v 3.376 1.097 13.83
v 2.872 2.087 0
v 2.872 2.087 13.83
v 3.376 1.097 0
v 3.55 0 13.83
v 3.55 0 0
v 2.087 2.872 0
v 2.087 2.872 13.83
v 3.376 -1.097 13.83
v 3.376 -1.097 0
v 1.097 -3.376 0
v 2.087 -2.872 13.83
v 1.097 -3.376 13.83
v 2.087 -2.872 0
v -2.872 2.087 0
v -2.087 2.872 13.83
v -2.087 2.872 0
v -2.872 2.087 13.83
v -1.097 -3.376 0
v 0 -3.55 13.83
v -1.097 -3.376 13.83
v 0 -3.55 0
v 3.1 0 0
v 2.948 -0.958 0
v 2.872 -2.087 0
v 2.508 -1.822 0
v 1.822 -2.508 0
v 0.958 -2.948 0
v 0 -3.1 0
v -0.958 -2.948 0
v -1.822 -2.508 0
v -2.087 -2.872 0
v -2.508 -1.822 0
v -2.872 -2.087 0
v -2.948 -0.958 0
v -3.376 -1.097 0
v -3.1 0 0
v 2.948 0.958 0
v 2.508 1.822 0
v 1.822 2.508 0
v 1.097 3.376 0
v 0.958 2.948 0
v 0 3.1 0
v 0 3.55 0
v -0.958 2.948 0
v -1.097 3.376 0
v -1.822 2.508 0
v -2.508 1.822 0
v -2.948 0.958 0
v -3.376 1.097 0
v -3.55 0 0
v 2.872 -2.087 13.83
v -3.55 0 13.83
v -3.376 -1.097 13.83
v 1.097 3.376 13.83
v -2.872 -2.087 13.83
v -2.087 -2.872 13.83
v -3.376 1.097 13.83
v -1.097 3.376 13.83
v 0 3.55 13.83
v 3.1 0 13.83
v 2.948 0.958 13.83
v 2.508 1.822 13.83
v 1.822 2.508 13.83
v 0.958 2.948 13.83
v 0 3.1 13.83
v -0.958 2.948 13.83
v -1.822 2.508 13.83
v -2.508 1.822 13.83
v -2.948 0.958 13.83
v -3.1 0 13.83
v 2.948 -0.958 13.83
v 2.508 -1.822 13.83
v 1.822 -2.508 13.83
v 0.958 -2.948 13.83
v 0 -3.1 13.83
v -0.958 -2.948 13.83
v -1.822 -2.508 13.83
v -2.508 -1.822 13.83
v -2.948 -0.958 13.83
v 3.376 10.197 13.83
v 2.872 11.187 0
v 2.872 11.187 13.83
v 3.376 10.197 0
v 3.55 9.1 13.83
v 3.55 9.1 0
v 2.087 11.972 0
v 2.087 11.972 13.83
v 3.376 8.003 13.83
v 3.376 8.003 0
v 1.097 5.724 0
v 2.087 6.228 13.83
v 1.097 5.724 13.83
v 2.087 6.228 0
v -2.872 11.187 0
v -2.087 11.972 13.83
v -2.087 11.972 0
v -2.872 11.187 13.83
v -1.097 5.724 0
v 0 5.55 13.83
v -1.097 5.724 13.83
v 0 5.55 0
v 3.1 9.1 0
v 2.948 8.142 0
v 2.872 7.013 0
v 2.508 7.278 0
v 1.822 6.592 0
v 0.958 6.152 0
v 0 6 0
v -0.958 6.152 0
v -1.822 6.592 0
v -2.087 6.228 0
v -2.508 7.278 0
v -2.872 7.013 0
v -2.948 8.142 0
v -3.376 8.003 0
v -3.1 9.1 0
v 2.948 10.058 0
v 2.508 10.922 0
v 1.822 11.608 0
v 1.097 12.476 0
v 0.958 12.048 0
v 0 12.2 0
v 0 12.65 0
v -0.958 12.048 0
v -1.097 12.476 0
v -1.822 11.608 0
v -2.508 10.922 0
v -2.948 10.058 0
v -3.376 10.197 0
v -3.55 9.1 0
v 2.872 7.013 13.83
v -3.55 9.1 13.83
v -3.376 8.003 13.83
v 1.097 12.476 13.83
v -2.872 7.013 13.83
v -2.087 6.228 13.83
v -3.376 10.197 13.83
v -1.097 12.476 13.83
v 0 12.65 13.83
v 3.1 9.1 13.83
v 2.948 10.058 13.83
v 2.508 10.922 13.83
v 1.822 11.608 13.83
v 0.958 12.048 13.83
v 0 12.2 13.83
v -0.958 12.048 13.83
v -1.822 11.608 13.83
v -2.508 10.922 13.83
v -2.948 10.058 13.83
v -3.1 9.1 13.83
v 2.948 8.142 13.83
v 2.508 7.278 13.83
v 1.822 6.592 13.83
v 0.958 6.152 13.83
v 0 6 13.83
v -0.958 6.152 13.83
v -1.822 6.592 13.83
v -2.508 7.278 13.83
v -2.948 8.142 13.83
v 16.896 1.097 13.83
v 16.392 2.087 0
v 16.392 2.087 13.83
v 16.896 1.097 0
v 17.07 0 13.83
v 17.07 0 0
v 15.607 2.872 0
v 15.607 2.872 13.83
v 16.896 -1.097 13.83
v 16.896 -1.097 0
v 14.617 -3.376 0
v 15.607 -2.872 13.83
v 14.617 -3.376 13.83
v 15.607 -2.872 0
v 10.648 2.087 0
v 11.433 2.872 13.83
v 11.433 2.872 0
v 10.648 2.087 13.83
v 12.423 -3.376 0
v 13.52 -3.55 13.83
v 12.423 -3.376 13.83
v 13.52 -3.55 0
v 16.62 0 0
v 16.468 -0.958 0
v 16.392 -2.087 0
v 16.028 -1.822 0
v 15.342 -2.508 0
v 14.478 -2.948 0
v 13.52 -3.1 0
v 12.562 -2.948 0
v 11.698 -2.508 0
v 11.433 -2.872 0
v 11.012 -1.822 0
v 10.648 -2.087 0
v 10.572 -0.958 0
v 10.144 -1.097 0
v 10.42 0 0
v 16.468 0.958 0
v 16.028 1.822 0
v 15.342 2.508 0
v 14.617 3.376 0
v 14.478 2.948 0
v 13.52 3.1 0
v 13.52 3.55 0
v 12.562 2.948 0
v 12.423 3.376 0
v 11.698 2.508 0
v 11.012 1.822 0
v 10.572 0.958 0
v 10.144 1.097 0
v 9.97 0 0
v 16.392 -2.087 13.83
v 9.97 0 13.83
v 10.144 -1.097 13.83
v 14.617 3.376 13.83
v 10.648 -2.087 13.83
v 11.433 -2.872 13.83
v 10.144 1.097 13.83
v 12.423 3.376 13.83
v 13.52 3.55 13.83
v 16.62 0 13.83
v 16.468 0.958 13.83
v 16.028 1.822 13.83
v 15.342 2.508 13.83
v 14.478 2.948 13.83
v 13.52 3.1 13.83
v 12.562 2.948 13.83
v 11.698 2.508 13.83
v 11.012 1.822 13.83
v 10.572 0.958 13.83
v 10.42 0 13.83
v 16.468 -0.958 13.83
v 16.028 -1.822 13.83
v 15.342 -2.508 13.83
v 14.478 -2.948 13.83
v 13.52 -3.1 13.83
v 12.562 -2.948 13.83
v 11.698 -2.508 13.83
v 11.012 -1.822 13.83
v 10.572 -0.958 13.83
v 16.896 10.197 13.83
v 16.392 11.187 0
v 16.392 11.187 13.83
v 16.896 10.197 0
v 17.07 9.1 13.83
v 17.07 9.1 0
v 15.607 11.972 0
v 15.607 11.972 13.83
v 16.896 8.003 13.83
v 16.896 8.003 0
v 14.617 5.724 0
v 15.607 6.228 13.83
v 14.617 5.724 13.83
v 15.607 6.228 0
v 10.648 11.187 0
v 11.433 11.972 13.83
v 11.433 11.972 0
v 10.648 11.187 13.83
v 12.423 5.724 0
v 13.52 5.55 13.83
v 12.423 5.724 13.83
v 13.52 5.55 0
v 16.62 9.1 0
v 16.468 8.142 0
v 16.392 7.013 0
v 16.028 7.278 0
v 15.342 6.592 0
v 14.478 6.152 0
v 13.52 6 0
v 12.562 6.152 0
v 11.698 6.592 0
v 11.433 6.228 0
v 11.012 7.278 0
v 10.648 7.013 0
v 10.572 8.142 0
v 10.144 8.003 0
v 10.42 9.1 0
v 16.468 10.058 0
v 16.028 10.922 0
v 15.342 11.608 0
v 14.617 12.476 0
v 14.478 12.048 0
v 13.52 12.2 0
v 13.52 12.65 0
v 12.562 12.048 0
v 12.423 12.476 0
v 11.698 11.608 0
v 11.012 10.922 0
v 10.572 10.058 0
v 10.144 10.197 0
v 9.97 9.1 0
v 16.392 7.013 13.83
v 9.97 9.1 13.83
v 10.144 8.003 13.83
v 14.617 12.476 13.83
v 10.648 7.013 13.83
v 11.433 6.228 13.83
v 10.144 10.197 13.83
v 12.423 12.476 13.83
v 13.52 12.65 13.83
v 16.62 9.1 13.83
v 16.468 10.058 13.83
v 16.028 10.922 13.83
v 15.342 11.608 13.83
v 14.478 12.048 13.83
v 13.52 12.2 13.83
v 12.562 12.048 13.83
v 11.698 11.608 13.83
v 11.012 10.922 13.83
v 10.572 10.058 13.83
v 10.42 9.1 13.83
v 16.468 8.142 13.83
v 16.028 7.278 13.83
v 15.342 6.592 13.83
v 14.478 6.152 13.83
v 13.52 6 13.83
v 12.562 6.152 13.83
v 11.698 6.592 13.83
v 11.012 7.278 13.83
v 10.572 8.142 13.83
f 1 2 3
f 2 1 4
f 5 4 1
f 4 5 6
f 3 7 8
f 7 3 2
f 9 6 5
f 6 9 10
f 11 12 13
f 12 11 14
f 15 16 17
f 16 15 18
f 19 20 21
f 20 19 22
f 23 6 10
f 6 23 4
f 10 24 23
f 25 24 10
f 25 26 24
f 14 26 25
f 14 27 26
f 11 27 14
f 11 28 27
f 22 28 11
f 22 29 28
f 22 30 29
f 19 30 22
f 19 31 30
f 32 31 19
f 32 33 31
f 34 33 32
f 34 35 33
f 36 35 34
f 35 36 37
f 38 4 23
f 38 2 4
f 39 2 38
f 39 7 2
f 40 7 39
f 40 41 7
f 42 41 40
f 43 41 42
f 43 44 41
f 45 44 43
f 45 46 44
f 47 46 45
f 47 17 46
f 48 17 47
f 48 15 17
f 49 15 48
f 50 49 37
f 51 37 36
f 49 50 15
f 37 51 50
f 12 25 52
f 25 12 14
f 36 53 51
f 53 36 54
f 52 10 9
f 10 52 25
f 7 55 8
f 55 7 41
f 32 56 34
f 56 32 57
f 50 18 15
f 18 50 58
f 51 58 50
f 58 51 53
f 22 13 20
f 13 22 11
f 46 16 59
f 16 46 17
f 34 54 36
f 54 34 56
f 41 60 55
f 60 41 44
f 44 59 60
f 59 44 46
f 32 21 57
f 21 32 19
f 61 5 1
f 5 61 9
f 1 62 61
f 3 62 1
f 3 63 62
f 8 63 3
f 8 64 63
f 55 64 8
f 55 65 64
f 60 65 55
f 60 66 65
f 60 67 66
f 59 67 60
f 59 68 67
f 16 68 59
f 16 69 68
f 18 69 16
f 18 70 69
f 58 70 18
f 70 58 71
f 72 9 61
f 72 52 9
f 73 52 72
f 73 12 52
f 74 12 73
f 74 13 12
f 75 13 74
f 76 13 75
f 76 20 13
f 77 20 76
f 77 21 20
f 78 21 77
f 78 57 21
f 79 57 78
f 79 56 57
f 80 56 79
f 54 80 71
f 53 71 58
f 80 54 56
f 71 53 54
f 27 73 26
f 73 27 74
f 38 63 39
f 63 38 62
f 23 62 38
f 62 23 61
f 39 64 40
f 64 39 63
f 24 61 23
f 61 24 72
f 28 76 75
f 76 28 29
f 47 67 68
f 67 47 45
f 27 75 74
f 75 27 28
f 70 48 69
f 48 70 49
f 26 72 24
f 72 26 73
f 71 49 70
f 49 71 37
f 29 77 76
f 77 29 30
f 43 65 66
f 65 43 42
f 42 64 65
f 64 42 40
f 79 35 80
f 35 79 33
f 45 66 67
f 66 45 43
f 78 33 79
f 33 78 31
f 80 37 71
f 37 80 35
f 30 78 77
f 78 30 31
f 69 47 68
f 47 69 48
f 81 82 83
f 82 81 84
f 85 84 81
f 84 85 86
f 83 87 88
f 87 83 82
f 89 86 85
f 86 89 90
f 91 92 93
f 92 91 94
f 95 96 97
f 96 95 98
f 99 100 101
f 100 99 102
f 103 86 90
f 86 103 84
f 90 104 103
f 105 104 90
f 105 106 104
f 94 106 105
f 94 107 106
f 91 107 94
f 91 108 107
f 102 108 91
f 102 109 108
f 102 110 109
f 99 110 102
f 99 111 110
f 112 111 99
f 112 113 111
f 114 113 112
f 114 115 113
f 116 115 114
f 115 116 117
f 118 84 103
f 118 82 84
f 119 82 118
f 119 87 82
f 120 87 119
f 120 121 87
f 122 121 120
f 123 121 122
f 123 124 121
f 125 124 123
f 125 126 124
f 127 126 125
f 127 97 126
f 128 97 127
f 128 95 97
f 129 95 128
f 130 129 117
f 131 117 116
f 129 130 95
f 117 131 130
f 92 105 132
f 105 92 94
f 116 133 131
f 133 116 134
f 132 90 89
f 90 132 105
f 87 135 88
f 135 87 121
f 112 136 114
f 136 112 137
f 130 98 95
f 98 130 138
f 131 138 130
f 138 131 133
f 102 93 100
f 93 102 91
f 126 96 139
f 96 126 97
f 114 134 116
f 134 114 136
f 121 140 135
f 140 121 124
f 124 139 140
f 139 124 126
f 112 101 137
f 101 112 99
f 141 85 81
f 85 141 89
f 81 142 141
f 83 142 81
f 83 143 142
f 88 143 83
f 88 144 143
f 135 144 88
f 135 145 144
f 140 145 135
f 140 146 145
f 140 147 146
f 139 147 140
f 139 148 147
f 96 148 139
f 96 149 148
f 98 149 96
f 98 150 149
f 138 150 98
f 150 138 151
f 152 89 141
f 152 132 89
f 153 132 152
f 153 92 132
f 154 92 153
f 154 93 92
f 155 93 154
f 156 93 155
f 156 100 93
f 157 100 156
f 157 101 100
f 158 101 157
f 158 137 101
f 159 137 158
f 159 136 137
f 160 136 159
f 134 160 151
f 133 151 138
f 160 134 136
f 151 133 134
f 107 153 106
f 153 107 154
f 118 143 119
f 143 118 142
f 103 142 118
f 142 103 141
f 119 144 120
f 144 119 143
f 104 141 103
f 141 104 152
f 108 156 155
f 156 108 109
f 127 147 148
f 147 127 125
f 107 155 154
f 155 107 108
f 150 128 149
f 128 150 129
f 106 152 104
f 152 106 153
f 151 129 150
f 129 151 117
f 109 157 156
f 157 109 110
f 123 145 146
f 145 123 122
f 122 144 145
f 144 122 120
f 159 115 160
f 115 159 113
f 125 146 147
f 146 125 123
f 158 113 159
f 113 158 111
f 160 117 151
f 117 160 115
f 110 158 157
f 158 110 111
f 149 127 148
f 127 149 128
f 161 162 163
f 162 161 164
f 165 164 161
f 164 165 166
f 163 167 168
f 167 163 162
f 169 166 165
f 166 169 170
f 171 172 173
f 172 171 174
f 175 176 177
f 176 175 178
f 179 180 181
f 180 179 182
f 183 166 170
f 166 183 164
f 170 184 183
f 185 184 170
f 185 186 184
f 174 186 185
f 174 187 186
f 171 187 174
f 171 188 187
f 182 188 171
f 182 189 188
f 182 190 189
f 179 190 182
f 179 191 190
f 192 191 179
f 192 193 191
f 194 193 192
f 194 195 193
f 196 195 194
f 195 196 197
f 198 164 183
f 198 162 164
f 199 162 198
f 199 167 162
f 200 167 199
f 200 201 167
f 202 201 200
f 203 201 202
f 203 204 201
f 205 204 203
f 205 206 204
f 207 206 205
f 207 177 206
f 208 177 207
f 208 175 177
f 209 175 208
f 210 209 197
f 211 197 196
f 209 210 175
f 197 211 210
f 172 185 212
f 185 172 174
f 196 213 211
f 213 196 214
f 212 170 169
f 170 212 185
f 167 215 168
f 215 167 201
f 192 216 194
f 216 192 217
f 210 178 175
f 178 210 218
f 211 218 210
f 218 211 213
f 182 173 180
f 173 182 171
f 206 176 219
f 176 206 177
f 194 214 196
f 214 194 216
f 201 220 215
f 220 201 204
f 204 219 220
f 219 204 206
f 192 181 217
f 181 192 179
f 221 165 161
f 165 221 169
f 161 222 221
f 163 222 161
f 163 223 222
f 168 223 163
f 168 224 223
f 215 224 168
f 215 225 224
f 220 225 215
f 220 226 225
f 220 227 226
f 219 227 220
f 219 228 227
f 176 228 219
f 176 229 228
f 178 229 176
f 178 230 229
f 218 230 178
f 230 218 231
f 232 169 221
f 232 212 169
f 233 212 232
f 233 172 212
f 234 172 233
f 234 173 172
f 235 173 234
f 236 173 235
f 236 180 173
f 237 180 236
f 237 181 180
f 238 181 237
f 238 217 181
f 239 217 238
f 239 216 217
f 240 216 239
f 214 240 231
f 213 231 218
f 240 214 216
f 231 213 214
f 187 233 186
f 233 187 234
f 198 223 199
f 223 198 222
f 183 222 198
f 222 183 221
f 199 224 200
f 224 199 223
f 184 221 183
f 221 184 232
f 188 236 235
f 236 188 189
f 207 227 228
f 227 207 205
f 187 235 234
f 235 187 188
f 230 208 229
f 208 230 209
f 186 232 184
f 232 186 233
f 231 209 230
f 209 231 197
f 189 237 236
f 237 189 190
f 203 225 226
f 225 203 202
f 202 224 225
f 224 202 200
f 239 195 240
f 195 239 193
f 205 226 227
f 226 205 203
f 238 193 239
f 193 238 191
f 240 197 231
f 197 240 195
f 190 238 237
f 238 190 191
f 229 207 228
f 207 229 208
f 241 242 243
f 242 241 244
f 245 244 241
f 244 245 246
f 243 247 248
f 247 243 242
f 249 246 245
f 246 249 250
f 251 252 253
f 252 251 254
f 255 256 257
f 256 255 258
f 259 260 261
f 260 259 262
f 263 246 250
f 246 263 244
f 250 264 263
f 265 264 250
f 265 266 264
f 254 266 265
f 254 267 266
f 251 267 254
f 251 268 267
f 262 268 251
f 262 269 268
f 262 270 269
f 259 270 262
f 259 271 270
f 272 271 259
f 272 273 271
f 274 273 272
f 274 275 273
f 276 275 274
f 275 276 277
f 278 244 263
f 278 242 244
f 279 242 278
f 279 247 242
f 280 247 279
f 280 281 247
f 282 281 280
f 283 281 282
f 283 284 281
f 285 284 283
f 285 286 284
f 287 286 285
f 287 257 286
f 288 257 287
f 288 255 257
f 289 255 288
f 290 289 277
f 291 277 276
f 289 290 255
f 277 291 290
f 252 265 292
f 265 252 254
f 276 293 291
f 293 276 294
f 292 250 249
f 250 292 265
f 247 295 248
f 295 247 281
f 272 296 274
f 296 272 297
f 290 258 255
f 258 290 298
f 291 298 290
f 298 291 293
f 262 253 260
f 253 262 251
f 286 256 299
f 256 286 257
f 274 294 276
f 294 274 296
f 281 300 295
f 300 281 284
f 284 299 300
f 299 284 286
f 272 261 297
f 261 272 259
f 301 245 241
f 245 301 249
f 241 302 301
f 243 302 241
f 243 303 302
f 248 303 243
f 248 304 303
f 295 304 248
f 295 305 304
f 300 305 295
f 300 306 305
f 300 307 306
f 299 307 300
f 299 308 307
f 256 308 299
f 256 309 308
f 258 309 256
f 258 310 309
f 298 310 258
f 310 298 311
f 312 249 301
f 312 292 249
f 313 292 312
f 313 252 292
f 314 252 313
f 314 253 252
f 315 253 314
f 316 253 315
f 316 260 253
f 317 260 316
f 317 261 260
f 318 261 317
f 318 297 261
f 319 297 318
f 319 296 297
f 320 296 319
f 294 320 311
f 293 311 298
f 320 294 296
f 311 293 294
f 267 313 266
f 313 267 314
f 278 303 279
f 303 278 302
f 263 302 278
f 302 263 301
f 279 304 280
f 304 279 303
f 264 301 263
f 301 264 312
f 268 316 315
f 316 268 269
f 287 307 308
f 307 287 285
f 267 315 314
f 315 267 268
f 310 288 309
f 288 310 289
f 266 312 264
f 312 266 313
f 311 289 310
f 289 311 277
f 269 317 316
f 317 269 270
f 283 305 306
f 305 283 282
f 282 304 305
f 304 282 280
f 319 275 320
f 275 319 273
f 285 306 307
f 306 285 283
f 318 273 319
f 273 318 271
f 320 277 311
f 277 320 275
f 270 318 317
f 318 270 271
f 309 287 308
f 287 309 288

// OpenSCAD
//spacers

//variables
dExterior = 7.1;
hExterior = 13.83;
dInterior = 6.2;
hInterior = hExterior*2;

xDiff = 6.42 + dExterior;
yDiff = 2 + dExterior;

//modules
module body3(){
    separator();
    translate([0,yDiff,0])
        separator();
    translate([xDiff,0,0])
        separator();
    translate([xDiff,yDiff,0])
        separator();
}

module separator(){
    translate([0,0,hExterior/2])
        difference(){
            cylinder(h=hExterior, d=dExterior, center=true, $fn=20);
            cylinder(h=hInterior, d=dInterior, center=true, $fn=20);
        }    
}

body3();
